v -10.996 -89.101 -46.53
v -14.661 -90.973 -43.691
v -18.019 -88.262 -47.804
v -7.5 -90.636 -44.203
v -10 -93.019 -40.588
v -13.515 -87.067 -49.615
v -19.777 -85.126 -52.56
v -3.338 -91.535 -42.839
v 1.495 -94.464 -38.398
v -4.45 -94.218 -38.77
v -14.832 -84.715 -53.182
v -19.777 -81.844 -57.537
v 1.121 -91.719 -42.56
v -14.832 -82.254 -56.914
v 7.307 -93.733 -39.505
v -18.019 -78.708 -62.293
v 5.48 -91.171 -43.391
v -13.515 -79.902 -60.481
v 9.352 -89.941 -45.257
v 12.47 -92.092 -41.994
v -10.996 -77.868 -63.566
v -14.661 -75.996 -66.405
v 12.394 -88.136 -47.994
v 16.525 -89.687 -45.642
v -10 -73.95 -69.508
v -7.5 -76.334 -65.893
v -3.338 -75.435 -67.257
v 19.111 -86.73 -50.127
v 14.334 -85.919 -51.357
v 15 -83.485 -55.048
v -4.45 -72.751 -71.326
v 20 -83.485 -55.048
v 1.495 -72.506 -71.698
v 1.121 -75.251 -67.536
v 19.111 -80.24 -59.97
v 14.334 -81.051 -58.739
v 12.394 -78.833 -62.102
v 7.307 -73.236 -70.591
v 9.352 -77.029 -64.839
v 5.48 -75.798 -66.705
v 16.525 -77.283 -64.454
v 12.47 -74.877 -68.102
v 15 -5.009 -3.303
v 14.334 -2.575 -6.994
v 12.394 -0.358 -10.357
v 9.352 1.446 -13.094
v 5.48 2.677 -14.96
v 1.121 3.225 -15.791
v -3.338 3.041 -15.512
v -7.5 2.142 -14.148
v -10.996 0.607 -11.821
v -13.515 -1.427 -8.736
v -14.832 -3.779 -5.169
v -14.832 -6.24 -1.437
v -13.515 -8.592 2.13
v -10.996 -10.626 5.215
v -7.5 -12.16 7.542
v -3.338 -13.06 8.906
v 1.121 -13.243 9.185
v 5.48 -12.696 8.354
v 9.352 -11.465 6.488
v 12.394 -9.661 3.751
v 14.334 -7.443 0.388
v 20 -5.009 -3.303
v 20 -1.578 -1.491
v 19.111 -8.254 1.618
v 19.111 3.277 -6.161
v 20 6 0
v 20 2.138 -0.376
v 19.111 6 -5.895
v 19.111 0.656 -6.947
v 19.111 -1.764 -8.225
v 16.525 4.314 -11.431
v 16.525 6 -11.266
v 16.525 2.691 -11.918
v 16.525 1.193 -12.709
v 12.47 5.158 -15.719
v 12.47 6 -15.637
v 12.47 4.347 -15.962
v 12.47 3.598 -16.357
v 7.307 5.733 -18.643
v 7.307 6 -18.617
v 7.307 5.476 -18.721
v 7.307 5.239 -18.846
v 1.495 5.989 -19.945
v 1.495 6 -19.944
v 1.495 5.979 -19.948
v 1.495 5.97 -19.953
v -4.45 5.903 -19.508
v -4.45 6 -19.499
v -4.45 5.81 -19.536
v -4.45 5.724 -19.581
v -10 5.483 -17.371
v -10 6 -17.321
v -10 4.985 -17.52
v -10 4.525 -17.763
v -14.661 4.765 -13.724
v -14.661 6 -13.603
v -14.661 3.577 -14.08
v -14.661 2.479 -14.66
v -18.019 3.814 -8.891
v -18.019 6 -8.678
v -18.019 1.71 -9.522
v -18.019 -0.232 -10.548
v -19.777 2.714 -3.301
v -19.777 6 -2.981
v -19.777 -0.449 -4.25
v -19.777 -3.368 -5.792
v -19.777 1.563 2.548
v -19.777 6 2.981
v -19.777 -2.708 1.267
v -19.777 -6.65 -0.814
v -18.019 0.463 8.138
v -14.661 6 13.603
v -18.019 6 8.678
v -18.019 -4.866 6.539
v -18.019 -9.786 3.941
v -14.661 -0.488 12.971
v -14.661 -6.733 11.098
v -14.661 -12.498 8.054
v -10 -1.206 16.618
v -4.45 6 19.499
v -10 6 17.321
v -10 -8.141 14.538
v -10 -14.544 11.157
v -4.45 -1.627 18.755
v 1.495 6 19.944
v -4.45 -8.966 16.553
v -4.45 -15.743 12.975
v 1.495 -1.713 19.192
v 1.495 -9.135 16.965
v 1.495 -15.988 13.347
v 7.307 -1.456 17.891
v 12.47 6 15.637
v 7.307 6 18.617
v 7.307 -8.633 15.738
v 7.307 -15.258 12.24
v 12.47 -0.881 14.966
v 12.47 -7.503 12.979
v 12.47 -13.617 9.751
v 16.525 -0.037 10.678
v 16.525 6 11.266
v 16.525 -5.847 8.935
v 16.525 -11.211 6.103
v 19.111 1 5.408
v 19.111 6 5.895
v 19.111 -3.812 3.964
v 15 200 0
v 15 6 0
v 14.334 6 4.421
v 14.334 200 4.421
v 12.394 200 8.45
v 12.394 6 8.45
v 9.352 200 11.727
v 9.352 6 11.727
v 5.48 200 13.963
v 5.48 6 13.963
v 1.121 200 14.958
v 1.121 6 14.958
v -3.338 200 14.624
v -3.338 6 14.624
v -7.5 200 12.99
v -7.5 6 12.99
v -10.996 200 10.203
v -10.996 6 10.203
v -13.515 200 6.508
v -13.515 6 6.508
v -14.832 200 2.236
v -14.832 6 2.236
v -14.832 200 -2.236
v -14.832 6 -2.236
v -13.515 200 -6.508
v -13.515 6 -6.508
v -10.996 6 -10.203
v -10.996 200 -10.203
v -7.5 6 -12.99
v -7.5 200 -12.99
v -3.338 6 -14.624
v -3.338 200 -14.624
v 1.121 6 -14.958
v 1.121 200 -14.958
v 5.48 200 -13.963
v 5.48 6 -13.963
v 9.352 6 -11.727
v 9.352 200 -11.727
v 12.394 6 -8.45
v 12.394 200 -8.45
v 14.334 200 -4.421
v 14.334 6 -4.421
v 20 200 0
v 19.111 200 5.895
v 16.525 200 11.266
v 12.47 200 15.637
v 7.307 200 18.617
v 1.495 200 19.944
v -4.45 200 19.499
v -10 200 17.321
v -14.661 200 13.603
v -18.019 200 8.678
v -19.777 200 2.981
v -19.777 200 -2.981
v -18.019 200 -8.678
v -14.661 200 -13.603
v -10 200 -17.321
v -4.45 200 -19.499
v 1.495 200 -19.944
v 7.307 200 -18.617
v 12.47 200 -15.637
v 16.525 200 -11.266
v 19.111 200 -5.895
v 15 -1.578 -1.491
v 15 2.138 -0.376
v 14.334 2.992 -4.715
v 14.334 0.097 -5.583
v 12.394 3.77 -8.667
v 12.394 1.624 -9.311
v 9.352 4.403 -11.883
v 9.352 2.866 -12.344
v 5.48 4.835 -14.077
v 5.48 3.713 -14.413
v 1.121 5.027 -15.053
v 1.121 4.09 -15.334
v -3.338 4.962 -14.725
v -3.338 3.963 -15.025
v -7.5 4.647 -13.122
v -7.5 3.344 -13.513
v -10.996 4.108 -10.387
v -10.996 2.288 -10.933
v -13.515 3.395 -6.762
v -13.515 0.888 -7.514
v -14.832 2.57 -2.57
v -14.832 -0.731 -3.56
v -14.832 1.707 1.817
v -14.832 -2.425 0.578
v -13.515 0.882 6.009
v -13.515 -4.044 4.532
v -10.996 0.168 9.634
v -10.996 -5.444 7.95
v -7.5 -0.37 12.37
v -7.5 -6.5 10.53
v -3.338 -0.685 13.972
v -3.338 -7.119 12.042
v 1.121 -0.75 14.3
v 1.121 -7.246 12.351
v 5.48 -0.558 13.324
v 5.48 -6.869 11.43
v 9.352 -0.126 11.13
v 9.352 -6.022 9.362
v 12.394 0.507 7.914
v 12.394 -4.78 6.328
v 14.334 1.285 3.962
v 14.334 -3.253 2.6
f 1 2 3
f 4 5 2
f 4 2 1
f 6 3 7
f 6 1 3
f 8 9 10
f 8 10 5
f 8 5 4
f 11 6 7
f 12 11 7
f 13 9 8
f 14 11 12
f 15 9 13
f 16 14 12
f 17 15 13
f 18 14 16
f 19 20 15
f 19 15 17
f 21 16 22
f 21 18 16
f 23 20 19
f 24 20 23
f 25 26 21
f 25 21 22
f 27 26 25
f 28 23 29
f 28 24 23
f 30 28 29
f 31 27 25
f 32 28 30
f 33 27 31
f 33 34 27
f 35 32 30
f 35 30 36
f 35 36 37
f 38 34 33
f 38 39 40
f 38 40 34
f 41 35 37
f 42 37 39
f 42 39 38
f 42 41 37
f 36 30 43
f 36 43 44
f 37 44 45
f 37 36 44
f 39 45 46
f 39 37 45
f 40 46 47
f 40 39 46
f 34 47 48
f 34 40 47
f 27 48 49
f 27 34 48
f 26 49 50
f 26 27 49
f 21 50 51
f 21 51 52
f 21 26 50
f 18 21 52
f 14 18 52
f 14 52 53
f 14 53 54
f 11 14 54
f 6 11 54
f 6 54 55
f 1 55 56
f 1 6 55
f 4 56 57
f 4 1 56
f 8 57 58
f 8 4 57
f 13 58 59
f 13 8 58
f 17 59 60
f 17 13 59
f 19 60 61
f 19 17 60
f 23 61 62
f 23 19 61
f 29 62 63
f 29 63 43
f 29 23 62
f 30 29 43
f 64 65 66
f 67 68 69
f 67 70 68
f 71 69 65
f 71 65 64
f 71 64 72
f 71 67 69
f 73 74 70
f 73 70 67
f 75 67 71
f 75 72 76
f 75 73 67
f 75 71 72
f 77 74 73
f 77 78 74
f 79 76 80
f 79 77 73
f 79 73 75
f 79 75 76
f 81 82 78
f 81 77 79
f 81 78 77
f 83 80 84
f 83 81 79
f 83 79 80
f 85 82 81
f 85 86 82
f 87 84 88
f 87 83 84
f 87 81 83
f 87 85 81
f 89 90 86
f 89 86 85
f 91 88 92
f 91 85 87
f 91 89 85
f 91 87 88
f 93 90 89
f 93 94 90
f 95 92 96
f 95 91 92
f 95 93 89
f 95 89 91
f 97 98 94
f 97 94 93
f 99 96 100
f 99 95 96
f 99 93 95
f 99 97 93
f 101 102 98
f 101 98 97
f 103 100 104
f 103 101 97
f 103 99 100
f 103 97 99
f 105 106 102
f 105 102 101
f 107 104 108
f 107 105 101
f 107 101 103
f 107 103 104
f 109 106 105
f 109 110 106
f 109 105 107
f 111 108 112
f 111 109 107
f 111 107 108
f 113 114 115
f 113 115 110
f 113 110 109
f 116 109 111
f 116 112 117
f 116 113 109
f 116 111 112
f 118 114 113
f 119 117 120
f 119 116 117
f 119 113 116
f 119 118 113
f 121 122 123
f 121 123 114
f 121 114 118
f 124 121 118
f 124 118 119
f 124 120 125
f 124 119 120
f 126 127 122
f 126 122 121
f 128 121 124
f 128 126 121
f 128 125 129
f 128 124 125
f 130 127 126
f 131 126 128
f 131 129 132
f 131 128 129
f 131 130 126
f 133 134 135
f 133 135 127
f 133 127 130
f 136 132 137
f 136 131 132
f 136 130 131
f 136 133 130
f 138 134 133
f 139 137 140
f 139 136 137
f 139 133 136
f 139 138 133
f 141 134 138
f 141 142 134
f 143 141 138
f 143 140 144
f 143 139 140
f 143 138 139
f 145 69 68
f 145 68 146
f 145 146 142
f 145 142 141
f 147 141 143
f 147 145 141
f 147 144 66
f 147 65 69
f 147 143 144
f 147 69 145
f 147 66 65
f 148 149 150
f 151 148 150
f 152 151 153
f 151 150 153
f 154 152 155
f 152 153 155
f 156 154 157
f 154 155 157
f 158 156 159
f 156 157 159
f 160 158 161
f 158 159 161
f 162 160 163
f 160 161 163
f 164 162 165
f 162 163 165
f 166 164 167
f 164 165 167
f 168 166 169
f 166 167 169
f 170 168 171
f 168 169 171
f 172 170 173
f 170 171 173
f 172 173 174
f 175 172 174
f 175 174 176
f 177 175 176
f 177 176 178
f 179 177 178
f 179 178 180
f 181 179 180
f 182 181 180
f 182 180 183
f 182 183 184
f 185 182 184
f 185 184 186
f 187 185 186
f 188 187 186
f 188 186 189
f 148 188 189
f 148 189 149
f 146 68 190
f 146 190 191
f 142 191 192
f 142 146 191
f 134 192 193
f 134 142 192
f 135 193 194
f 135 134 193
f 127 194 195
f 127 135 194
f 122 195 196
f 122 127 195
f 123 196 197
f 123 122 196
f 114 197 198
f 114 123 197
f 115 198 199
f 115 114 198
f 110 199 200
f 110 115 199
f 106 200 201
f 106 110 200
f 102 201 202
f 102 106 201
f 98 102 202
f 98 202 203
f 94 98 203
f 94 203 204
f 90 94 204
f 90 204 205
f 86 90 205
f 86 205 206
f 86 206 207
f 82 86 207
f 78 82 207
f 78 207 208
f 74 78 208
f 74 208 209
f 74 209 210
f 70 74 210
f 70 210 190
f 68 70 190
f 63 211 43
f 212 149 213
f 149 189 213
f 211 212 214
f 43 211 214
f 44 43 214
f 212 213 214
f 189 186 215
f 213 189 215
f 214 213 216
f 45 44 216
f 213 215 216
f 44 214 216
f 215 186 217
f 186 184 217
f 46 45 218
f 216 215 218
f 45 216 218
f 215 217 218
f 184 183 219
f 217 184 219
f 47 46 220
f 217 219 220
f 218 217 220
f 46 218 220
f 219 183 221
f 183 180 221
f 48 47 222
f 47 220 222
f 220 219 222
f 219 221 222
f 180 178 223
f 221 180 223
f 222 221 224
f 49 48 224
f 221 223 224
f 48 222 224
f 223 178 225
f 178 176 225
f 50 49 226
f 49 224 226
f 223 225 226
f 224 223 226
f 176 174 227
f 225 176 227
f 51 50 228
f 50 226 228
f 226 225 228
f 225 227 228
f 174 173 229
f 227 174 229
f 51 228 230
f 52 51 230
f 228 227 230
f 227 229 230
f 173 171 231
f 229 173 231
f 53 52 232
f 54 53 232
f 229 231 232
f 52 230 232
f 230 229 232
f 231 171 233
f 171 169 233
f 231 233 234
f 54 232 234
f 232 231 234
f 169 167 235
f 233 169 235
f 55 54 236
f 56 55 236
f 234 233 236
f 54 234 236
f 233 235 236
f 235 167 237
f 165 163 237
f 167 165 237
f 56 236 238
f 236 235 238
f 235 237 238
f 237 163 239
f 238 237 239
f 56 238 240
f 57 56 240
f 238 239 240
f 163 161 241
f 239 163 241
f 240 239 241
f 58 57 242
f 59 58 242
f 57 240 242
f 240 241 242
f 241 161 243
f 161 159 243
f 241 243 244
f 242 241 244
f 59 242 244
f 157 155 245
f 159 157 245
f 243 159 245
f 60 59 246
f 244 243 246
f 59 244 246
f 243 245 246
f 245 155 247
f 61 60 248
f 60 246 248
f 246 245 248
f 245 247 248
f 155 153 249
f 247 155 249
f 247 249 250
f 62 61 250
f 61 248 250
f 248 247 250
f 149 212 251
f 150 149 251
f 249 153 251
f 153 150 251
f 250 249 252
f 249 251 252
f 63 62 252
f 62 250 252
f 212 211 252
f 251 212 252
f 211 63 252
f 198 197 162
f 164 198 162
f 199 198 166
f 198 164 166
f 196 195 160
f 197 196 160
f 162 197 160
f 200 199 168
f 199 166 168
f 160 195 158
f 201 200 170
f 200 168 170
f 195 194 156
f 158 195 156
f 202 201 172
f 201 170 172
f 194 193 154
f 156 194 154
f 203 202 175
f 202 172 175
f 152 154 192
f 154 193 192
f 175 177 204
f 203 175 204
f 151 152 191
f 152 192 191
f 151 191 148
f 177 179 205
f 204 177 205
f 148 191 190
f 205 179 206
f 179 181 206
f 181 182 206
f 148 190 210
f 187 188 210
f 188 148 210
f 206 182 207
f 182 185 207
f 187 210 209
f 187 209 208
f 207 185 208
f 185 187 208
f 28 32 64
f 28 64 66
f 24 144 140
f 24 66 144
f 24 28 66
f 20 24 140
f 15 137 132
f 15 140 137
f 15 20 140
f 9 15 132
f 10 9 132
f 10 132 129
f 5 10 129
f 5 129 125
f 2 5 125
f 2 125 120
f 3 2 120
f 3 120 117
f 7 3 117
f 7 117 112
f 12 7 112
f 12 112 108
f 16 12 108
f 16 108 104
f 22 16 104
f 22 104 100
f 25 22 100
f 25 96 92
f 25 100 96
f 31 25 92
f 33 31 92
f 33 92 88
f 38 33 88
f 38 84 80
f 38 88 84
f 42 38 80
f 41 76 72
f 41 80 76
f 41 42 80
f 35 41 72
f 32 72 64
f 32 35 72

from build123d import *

# Parameters (mm, degrees)
F2_R   = 20
F2_R_2 = 15


with BuildPart() as f3:
    # F3: sweep along a path in F0
    with BuildLine(Plane.YZ) as f3_path:
        Line((200, 0), (6.000288, 0))
        ThreePointArc((6.000288, 0), (0.253077, -0.84355), (-5.009327, -3.303043))
        Line((-5.009327, -3.303043), (-83.484786, -55.048074))
    # F2 (on offset) → F3 (sweep)
    with BuildSketch(Plane.XZ.offset(-200)):
        Circle(F2_R)
        Circle(F2_R_2, mode=Mode.SUBTRACT)
    sweep(path=f3_path.line)


solid = f3.part
